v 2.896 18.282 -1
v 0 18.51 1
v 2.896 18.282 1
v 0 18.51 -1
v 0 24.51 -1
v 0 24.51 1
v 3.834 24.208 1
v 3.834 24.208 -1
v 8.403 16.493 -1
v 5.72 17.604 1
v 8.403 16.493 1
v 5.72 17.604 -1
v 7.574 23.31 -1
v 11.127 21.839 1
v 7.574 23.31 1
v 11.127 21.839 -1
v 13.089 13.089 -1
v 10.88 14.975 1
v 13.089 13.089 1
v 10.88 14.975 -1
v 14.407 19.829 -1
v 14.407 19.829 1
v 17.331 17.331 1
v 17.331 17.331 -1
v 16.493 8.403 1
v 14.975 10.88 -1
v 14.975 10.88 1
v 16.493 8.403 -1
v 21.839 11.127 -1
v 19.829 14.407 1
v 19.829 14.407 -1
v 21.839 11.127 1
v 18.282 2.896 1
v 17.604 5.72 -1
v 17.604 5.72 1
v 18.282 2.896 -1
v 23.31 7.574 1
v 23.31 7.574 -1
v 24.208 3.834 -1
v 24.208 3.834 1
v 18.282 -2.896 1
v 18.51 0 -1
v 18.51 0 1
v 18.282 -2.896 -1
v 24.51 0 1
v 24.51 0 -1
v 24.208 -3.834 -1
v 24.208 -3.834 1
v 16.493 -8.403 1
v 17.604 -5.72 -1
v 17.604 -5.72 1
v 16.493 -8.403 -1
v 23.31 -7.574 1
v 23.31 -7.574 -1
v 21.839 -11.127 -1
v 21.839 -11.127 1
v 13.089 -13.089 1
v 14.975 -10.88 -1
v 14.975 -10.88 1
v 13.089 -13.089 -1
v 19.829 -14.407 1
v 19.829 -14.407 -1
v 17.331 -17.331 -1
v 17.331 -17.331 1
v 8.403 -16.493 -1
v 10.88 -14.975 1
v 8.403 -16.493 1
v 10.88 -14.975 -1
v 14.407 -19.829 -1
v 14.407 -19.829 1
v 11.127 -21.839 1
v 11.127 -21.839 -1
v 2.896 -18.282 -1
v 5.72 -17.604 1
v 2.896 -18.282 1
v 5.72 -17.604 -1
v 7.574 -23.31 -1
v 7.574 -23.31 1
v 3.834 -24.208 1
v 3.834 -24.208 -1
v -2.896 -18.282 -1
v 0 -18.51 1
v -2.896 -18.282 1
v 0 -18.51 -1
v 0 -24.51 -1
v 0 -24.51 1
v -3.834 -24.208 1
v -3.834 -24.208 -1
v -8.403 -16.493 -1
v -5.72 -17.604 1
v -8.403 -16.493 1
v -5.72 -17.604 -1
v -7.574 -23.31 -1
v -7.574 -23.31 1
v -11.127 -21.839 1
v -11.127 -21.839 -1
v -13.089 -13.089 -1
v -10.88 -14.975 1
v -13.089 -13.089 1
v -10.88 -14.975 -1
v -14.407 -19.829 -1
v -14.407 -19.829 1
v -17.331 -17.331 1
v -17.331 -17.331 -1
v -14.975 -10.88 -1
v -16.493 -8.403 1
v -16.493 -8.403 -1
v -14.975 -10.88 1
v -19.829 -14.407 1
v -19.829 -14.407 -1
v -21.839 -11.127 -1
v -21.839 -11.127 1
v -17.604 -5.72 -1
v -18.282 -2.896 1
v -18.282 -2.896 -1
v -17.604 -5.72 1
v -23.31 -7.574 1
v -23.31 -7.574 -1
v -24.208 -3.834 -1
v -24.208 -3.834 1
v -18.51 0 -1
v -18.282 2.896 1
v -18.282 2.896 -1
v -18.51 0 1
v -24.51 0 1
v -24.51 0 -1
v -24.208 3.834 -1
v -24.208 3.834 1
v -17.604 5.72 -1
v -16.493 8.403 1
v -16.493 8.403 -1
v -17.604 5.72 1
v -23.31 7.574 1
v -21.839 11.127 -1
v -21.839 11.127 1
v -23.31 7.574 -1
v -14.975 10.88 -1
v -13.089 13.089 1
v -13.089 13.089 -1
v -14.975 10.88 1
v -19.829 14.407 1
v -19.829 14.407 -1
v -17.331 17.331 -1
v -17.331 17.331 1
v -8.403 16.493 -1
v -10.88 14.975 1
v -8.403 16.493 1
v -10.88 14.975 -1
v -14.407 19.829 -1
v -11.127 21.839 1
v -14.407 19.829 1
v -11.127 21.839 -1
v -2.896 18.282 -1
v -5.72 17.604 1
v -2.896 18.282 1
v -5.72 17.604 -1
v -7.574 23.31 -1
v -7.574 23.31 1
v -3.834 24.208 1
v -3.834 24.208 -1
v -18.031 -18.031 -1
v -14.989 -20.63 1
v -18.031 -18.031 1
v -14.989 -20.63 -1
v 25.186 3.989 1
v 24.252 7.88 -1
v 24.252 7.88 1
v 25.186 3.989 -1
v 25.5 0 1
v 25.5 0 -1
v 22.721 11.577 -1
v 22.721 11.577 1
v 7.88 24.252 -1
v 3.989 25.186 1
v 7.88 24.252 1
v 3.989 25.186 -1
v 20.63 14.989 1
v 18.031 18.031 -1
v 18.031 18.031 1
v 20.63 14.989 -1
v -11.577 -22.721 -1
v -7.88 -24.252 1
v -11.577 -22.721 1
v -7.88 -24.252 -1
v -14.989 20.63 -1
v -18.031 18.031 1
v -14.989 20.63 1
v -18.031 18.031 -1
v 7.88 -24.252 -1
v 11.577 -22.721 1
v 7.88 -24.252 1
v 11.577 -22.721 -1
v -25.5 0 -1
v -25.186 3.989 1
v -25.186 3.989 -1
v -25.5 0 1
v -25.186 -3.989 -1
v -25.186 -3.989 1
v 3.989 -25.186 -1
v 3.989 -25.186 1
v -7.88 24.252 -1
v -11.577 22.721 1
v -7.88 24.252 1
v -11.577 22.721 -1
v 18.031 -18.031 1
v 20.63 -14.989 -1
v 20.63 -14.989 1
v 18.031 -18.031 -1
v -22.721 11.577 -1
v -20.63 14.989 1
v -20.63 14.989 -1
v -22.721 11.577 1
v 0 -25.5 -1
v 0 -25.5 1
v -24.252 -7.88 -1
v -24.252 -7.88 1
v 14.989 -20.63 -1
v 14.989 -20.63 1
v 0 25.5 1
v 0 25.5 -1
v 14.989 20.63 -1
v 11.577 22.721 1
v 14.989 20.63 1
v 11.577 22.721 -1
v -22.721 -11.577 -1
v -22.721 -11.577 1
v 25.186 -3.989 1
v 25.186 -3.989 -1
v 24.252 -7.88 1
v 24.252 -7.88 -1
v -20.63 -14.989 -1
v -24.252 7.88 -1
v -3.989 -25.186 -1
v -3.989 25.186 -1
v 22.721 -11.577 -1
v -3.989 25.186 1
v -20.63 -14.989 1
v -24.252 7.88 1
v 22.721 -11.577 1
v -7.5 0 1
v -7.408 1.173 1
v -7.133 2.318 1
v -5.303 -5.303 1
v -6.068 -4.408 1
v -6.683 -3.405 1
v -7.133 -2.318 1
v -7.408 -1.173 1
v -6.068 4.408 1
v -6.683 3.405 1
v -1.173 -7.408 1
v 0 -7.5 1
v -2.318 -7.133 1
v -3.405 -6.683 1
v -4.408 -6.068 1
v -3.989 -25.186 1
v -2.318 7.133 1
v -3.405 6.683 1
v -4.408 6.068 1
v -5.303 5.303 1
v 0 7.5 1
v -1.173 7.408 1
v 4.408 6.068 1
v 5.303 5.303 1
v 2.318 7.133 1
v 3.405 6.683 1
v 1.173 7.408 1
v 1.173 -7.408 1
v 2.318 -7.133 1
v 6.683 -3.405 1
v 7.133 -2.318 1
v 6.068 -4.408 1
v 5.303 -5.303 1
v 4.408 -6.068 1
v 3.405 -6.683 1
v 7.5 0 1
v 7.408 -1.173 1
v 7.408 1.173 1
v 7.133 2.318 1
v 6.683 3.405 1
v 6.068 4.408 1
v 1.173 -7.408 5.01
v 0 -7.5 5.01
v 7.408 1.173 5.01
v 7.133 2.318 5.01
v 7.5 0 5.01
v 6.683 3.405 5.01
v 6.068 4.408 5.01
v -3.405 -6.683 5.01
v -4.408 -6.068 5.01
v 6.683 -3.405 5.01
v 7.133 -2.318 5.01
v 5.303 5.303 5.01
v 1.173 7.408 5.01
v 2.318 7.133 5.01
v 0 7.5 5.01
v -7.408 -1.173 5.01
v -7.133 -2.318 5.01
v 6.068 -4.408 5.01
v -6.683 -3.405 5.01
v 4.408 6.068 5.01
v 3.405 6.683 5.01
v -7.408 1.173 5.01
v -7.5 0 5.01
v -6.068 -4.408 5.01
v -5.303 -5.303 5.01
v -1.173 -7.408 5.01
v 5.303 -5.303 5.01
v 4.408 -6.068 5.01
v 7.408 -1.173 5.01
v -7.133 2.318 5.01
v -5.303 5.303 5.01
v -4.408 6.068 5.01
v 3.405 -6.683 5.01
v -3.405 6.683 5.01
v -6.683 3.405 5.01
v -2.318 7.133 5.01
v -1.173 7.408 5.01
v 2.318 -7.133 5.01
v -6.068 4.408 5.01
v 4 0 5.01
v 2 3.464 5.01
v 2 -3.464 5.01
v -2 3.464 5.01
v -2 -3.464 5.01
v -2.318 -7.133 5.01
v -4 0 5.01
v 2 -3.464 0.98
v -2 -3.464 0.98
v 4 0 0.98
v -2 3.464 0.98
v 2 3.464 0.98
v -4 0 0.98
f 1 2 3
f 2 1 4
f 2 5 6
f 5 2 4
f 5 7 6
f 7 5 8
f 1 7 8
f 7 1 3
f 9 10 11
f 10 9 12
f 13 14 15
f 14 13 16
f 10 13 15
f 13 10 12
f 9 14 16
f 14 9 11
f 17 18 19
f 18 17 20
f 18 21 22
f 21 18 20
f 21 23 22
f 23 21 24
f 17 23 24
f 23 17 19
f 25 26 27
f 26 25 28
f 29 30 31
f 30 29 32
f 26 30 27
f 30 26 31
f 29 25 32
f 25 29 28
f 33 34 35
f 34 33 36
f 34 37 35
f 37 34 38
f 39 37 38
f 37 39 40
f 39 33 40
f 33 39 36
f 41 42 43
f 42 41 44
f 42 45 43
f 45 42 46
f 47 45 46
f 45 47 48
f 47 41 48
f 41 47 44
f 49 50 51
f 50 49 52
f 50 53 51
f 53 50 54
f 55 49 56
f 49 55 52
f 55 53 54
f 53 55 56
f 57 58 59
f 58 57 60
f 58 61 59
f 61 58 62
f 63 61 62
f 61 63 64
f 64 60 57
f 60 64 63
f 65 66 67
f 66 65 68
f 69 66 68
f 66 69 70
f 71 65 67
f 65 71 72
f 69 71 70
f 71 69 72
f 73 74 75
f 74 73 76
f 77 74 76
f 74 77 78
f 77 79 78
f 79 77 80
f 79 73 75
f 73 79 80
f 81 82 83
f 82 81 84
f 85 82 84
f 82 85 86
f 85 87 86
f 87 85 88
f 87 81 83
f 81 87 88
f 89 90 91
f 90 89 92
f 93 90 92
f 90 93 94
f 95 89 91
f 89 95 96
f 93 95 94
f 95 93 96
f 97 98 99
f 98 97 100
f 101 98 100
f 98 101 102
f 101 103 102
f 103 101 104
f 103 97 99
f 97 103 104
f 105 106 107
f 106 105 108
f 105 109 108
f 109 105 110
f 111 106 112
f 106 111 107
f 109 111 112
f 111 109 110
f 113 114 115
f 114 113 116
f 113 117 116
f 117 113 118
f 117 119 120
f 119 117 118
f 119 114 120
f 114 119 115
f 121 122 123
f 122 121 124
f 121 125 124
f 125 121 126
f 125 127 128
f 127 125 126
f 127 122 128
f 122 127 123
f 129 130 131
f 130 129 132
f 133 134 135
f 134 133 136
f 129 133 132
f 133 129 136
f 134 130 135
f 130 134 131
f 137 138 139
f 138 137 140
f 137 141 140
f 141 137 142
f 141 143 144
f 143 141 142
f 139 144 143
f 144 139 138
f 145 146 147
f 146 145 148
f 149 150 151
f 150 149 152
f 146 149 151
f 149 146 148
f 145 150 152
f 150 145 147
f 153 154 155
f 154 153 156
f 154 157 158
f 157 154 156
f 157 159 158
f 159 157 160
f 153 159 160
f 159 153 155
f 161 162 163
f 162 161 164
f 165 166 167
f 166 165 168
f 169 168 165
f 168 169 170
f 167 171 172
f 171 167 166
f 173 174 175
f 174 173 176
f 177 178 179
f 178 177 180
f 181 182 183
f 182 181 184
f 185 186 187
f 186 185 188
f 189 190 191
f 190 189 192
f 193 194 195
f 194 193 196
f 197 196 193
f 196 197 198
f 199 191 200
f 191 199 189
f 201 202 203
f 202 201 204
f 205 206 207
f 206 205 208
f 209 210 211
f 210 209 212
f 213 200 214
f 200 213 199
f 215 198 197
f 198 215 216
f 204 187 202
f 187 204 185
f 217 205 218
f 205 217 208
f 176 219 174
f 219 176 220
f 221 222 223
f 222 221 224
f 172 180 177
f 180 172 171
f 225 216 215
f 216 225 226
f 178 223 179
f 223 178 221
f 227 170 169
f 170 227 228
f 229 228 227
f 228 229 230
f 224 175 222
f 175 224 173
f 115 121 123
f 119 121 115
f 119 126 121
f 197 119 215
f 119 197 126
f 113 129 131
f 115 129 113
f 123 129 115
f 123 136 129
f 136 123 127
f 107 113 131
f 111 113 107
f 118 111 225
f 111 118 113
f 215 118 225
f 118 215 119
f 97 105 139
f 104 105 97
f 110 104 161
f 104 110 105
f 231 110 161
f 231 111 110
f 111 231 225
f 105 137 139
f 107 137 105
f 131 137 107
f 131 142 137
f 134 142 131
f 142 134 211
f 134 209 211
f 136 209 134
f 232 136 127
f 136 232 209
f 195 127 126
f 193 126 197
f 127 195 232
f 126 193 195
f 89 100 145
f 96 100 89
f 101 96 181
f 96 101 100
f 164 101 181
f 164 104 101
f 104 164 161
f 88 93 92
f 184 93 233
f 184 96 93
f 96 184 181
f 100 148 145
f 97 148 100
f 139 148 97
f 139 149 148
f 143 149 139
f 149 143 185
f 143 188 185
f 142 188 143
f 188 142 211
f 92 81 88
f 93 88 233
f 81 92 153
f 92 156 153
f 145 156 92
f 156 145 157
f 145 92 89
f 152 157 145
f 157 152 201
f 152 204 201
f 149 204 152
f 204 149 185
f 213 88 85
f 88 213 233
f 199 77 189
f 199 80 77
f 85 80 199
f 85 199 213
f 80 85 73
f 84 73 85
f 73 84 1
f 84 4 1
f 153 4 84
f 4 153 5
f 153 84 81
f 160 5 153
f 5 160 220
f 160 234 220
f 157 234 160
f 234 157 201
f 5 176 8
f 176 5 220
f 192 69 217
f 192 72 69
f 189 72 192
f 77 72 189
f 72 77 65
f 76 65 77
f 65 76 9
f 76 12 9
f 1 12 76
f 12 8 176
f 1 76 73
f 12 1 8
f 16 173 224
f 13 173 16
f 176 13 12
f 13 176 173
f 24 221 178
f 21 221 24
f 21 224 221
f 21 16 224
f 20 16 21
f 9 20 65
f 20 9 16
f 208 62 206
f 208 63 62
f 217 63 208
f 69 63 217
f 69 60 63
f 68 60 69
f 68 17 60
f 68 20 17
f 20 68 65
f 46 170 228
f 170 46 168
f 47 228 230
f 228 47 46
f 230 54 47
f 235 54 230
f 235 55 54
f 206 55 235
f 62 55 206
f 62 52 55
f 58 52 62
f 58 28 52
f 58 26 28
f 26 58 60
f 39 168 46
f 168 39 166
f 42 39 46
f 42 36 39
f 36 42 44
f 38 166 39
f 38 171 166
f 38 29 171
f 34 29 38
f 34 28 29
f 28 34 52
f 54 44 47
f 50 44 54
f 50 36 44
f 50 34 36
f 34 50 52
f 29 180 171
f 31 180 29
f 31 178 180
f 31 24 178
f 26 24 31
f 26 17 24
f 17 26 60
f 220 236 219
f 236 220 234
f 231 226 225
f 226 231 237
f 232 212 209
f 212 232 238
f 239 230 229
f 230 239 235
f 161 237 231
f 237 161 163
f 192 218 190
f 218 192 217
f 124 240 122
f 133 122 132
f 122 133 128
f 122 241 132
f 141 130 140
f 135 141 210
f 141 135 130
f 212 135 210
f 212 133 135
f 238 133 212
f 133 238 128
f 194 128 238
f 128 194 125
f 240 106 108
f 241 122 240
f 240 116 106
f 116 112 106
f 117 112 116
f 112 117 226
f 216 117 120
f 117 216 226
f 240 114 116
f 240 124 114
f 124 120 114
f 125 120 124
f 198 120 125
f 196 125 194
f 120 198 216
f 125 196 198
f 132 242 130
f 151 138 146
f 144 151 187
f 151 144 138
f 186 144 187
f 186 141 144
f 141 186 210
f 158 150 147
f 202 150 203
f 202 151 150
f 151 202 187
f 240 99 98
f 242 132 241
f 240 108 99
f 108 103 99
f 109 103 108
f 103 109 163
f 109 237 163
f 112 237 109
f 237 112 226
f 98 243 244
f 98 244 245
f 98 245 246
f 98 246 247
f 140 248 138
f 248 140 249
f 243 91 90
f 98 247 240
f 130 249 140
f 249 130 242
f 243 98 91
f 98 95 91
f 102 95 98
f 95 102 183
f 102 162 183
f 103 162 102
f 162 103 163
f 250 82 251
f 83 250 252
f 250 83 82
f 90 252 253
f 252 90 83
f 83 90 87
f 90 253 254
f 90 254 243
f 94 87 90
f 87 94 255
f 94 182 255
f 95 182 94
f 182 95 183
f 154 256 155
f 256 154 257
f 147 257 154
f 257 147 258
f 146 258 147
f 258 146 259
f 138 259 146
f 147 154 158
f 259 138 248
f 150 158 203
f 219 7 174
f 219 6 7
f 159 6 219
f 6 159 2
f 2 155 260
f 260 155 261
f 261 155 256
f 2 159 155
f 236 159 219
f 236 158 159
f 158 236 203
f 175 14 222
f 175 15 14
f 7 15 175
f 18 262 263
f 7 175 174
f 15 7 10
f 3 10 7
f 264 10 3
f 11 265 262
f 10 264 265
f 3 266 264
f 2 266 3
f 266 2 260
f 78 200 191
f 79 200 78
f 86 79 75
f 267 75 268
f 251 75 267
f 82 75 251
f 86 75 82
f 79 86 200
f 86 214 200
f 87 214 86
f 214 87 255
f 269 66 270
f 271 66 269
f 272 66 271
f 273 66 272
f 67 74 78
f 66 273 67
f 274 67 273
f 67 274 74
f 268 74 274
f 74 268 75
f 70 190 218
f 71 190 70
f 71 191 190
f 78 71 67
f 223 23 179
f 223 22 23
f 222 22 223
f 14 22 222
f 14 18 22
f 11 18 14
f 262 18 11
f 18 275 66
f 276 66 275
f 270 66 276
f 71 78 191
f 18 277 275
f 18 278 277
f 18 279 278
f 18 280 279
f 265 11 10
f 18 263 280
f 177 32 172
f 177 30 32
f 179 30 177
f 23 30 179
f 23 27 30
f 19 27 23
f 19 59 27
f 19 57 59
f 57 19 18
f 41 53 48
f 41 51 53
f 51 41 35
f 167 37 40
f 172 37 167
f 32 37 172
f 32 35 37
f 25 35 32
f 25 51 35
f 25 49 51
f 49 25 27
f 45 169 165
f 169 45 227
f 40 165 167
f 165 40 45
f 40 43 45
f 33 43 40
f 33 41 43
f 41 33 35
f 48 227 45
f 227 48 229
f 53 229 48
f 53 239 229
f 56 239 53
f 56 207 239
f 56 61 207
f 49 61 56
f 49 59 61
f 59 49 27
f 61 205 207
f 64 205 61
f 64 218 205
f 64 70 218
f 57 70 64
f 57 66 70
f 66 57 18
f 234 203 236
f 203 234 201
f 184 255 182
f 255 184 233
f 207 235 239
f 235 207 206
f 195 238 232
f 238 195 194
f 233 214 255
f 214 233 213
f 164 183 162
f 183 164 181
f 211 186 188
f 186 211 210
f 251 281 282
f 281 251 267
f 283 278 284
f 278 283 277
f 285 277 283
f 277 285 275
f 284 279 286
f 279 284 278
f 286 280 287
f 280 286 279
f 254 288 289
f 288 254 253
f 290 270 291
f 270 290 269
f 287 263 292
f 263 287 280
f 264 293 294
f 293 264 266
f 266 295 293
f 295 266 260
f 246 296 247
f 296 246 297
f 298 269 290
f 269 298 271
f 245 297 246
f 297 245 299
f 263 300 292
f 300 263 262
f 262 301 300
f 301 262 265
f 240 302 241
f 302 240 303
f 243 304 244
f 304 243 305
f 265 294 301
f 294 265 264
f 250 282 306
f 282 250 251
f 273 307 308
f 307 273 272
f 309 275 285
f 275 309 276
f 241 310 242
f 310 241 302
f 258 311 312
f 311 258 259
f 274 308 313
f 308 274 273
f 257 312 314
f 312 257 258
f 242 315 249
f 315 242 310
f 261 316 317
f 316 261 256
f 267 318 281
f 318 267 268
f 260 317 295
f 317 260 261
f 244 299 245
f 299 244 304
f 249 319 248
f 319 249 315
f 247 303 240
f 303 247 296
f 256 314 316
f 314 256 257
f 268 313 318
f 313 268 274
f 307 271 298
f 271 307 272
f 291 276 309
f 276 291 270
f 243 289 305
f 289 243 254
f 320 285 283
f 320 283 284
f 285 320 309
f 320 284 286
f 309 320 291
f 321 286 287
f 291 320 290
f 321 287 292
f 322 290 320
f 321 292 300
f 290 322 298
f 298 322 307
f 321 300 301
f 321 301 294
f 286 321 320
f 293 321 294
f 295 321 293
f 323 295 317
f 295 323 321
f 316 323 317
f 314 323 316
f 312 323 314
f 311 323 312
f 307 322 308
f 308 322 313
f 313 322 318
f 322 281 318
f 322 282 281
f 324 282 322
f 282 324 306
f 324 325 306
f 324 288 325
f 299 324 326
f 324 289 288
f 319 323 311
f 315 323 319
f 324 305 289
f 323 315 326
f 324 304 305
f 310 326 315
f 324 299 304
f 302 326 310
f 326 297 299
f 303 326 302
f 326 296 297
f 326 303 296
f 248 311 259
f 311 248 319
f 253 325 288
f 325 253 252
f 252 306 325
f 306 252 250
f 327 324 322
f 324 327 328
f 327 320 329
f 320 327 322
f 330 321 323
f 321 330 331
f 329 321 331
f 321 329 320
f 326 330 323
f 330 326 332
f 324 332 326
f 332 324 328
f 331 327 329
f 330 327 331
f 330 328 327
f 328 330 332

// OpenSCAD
//customizable optical encoder
// James Wickware - 7/18/2016

// preview[view:north east, tilt:top diagonal]

/* [Encoder] */
// the outer diameter of the optical encoder in millimeters.
outer_diameter = 51; //[0:150] 

// the height of the encoder wheel in millimeters.
wheel_height = 2; //[0.1:0.1:20]

// the length of the slits in millimeters.
slit_length = 6; //[0:0.5:75]

// the number of slits in the encoder.
slit_count = 20; // [2:100]

// the ratio of the slit opening to the solid section between the slits. (0.5 is equal )
slit_ratio = 0.5; // [0.05:0.05:0.95]

// the distance between the outer diameter and the opening of the slits in millimeters.
rim_width =  1; // [0:0.25:25]



/* [Hub] */
// the diameter of the inner hub in millimeters.
hub_diameter = 15; // [0:0.25:25]

// the length that the hub shaft extends from the encoder wheel in millimeters.
hub_height = 4; // [0:0.5:50]


/* [Shaft] */
// the type of shaft 0 for circular shaft, 1 d shaft (circular with 1 flat, 2 double d shaft (circular with 2 flats), 3 for square shaft 4 for hex shaft, 5 for octagonal shaft.
shaft_type = 4; //[0:Cylindrical Shaft, 1:D Type Shaft,2:Double D type Shaft,3:Square Shaft, 4:Hexagonal Shaft, 5:Octagonal Shaft]

// the diameter of the hole for the shaft in millimeters.
shaft_diameter = 8; //[0:0.1:20]

// Choose whether or not you want the shaft to go all the way through the encoder wheel.
shaft_goes_through_encoder =0 ; // [0:False,1:True]

// the depth of the flat from the outside edge of the shaft in millimeters (for d and double d shaft type only).
shaft_flat_depth = 2; // [0:0.1:10]


/* [Set Screw] */
// choose whether to include a hole for a set screw
set_screw = 0; // [0:False,1:True]

// the size of the set screw in millimeters
set_screw_diameter = 3; // [0:0.5:10]

// choose whether to include a slot for a set screw nut (automatically disabled when there is not enough room for it).
set_screw_nut = 1; // [0:False,1:True]

// the set screw nut diameter in millimeters. (for hex nuts, the distance from one corner to the opposite corner)
set_screw_nut_diameter = 5; // [1:0.25:14]
 
//  the set screw nut thickness in millimeters
set_screw_nut_thickness = 2; //[0.25:0.25:10]

/* [Hidden] */

// the outer radius
outer_radius = max(outer_diameter/2, hub_diameter/2);

// the hub radius.
hub_radius = hub_diameter/2;
shaft_radius = shaft_diameter/2;

// the depth of the hole for the shaft in millimeters.
shaft_depth = hub_height + (wheel_height*shaft_goes_through_encoder);  

// calcuate whether or not the set screw and or nut can safely be included.
min_set_screw_nut_diameter = set_screw_diameter + 0.5;
max_set_screw_nut_diameter = (hub_diameter - shaft_diameter) * 0.6; // allow 60% of distance between shaft and hub
max_set_screw_nut_thickness = (hub_radius - shaft_radius) * 0.6; // allow 60% of distance between shaft and hub

can_have_screw =  (hub_height-0.99 > set_screw_diameter)  ? 1:0 ;
  
can_have_nut =  ((set_screw_diameter > 0) ? 1: 0)
                 * ((set_screw_diameter < set_screw_nut_diameter) ? 1:0)
                * ((set_screw_nut_thickness < max_set_screw_nut_thickness) ? 1:0) 
                * set_screw_nut
                * can_have_screw;
echo(can_have_screw);
echo(can_have_nut);

set_screw_nut_offset = (((shaft_type == 0) ? 1:0) * .95)
                       +(((shaft_type == 1) ? 1:0) * .85)
                       +(((shaft_type == 2) ? 1:0) * .85)
                       +(((shaft_type == 3) ? 1:0) * .925)
                       +(((shaft_type == 4) ? 1:0) * .925)
                       +(((shaft_type == 5) ? 1:0) * .925)
                       +(((shaft_type == 6) ? 1:0) * .925)
                       +(((shaft_type == 7) ? 1:0) * .925)
                       +(((shaft_type == 8) ? 1:0) * .925)
                       ;
                       
                       
                       echo(set_screw_nut_offset);
// fudge factor to prevent coplanar boolean issues
fudge = 0.01;
difference(){
    union(){
 
        // Setup variables for wheel
        outer_rad = max((outer_radius - rim_width ) + fudge, hub_radius + fudge) ;
        inner_rad = max((outer_radius - rim_width - max(slit_length,0)) + fudge , hub_radius + fudge );
        step = 360/slit_count;
        half_step = step/2;
        qtr_step =  half_step / 2 ;       
        
        echo("step");
        echo (step);
        ratio_angle = (slit_ratio-0.5) * half_step;
        // don't create slits if some touch-hard has made the hub too big
        if(outer_rad > inner_rad){ 
            // create the wheel
            difference(){
                cylinder(r = outer_diameter/2, h= wheel_height, $fn = slit_count * 2, center = true);
             
                if( slit_count%2 == 0){

                    // create slits
                    for (i = [0 :  step : 360 - fudge  ])
                    {
                        points = [
                        [ sin(i +ratio_angle)*outer_rad, cos(i+ratio_angle)*outer_rad , -wheel_height ],  
                        [ sin(i +ratio_angle)*inner_rad, cos(i+ratio_angle)*inner_rad,  -wheel_height ], 
                        [ sin(i+half_step - ratio_angle)*inner_rad , cos(i+half_step- ratio_angle)*inner_rad, -wheel_height ],  
                        [ sin(i+half_step - ratio_angle)*outer_rad,  cos(i+half_step- ratio_angle)*outer_rad, -wheel_height ],
                        [ sin(i+ratio_angle)*outer_rad, cos(i+ratio_angle)*outer_rad,  wheel_height ],
                        [ sin(i+ratio_angle)*inner_rad, cos(i+ratio_angle)*inner_rad,  wheel_height ],
                        [ sin(i+half_step - ratio_angle)*inner_rad , cos(i+half_step- ratio_angle)*inner_rad,  wheel_height ],
                        [ sin(i+half_step - ratio_angle)*outer_rad,  cos(i+half_step- ratio_angle)*outer_rad,  wheel_height ]
                        ];

                        faces = [
                        [0,1,2,3],   
                        [4,5,1,0],   
                        [7,6,5,4],   
                        [5,6,2,1],   
                        [6,7,3,2],  
                        [7,4,0,3]];  

                        rotate(0,0,i)
                        polyhedron( points, faces ) ; 
                    } 
                }
                else{   
                    for (i = [0 :  step : 360  - fudge])
                    {
                        points = [
                        [ sin(i-qtr_step)*outer_rad, cos(i-qtr_step)*outer_rad , -wheel_height ],  
                        [ sin(i-qtr_step)*inner_rad, cos(i-qtr_step)*inner_rad,  -wheel_height ], 
                        [ sin(i+qtr_step)*inner_rad , cos(i+qtr_step)*inner_rad, -wheel_height ],  
                        [ sin(i+qtr_step)*outer_rad,  cos(i+qtr_step)*outer_rad, -wheel_height ],
                        [ sin(i-qtr_step)*outer_rad, cos(i-qtr_step)*outer_rad,  wheel_height ],
                        [ sin(i-qtr_step)*inner_rad, cos(i-qtr_step)*inner_rad,  wheel_height ],
                        [ sin(i+qtr_step)*inner_rad , cos(i+qtr_step)*inner_rad,  wheel_height ],
                        [ sin(i+qtr_step)*outer_rad,  cos(i+qtr_step)*outer_rad,  wheel_height ]
                        ];

                        faces = [
                        [0,1,2,3],   
                        [4,5,1,0],   
                        [7,6,5,4],   
                        [5,6,2,1],   
                        [6,7,3,2],  
                        [7,4,0,3]];  

                        rotate(0,0,i)
                        polyhedron( points, faces ) ;
                    }
                }
                
            }
        }
        
        // create hub
        if(hub_height > 0){
            if(set_screw == 1 && set_screw_diameter > 0 && can_have_screw == 1){
                difference(){
                  translate([0,0, ((hub_height/2) + (wheel_height /2))] )       
                  cylinder(r= min(hub_diameter/2, (outer_diameter/2)-fudge ), h = hub_height +(fudge*2), $fn = slit_count *2, center = true);
                    
                    // set screw hole
                    translate([0,0, ((hub_height/2) + (wheel_height/2 ))] ) 
                    rotate([-90,0,0]) 
                     cylinder(r=set_screw_diameter/2, h=hub_diameter, $fn=16);
                    if(can_have_nut == 1){
                    // set screw nut
                   translate([0,(hub_radius - ((hub_radius-shaft_radius)/2))*set_screw_nut_offset, ((hub_height/2) + (wheel_height/2 ))] )     
                    rotate([90,00,00])
                    cylinder(r=max(min_set_screw_nut_diameter/2,set_screw_nut_diameter/2), h=max(set_screw_nut_thickness,0.25) +fudge, $fn=6, center = true);
                    
                   translate([0,(hub_radius - ((hub_radius-shaft_radius)/2))*set_screw_nut_offset, ((hub_height/2) + (wheel_height/2 )) + 
                    (((hub_height/2) + (wheel_height/2 )+set_screw_nut_diameter /2 )-fudge) /2] )  
                    cube([max(min_set_screw_nut_diameter ,set_screw_nut_diameter ) ,max(set_screw_nut_thickness,0.25)-fudge,(((hub_height/2) + (wheel_height/2 )+max(min_set_screw_nut_diameter ,set_screw_nut_diameter ) /2 ))  ],center=true);
                    }
                    
                    }
            }
            else {
                translate([0,0, ((hub_height/2) + (wheel_height /2))] )       
                cylinder(r= min(hub_diameter/2, (outer_diameter/2)-fudge ), h = hub_height +(fudge*2), $fn = slit_count *2, center = true);        
            }
        }
    };
 
 // shaft
    // cylindrical shaft
    if(shaft_type == 0){
        translate([0,0, ((shaft_depth/2) + (wheel_height /2) + (hub_height ))]) // move shaft to the top of the hub
        translate([0,0,-min(shaft_depth, hub_height+wheel_height)]) // insert the shaft until it hits bottom >:)

        cylinder(r= shaft_diameter/2, h=shaft_depth + (fudge*4) , $fn = max(slit_count*2, 6) ,center = true);
    }
    
    // d type shaft
    if(shaft_type == 1)
    {
        translate([0,0, ((shaft_depth/2) + (wheel_height /2) + (hub_height ))]) // move shaft to the top of the hub
        translate([0,0,-min(shaft_depth, hub_height+wheel_height)]) // insert the shaft until it hits bottom >:)
    
        difference(){
            cylinder(r= shaft_diameter/2, h=shaft_depth + (fudge*4) , $fn = max(slit_count*2, 6) ,center = true);    
       
            translate([0, max( shaft_diameter - shaft_flat_depth , shaft_diameter/2),0  ]) 
            cube ( [shaft_diameter*2,shaft_diameter, shaft_depth*2 ], center = true)  ; 
       }  
    }

    // double d type shaft -- double D = big breasts -- 
    if (shaft_type == 2)
    {
        translate([0,0, ((shaft_depth/2) + (wheel_height /2) + (hub_height ))]) // move shaft to the top of the hub
        translate([0,0,-min(shaft_depth, hub_height+wheel_height)]) // insert the shaft until it hits bottom >:)
    
        difference(){
            cylinder(r= shaft_diameter/2, h=shaft_depth + (fudge*4) , $fn = max(slit_count*2, 6) ,center = true);    
         
            translate([0, max( shaft_diameter - shaft_flat_depth , shaft_diameter/2),0  ]) 
            cube ( [shaft_diameter*2,shaft_diameter, shaft_depth*2 ], center = true); 
         
            translate([0, min( -( shaft_diameter - shaft_flat_depth), -(shaft_diameter/2)),0  ]) 
            cube ( [shaft_diameter*2,shaft_diameter, shaft_depth*2 ], center = true); 
        }  
    }
    
    // square shaft
    if (shaft_type == 3)
    {
        translate([0,0, ((shaft_depth/2) + (wheel_height /2) + (hub_height ))]) // move shaft to the top of the hub
        translate([0,0,-min(shaft_depth, hub_height+wheel_height)]) // insert the shaft until it hits bottom >:)
        rotate([0,0,45]) 
        cylinder(r= shaft_diameter/2, h=shaft_depth + (fudge*4) , $fn = 4 ,center = true);
    }
    
    // hex shaft
    if (shaft_type == 4)
    {
        translate([0,0, ((shaft_depth/2) + (wheel_height /2) + (hub_height ))]) // move shaft to the top of the hub
        translate([0,0,-min(shaft_depth, hub_height+wheel_height)]) // insert the shaft until it hits bottom >:)
    
        cylinder(r= shaft_diameter/2, h=shaft_depth + (fudge*4) , $fn =   6  ,center = true);
    }
    
    // octopus shaft
    if (shaft_type == 5)
    {
        translate([0,0, ((shaft_depth/2) + (wheel_height /2) + (hub_height ))]) // move shaft to the top of the hub
        translate([0,0,-min(shaft_depth, hub_height+wheel_height)]) // insert the shaft until it hits bottom >:)
      rotate([0,0,22.5]) 
        cylinder(r= shaft_diameter/2, h=shaft_depth + (fudge*4) , $fn =   8  ,center = true);
    }
}
